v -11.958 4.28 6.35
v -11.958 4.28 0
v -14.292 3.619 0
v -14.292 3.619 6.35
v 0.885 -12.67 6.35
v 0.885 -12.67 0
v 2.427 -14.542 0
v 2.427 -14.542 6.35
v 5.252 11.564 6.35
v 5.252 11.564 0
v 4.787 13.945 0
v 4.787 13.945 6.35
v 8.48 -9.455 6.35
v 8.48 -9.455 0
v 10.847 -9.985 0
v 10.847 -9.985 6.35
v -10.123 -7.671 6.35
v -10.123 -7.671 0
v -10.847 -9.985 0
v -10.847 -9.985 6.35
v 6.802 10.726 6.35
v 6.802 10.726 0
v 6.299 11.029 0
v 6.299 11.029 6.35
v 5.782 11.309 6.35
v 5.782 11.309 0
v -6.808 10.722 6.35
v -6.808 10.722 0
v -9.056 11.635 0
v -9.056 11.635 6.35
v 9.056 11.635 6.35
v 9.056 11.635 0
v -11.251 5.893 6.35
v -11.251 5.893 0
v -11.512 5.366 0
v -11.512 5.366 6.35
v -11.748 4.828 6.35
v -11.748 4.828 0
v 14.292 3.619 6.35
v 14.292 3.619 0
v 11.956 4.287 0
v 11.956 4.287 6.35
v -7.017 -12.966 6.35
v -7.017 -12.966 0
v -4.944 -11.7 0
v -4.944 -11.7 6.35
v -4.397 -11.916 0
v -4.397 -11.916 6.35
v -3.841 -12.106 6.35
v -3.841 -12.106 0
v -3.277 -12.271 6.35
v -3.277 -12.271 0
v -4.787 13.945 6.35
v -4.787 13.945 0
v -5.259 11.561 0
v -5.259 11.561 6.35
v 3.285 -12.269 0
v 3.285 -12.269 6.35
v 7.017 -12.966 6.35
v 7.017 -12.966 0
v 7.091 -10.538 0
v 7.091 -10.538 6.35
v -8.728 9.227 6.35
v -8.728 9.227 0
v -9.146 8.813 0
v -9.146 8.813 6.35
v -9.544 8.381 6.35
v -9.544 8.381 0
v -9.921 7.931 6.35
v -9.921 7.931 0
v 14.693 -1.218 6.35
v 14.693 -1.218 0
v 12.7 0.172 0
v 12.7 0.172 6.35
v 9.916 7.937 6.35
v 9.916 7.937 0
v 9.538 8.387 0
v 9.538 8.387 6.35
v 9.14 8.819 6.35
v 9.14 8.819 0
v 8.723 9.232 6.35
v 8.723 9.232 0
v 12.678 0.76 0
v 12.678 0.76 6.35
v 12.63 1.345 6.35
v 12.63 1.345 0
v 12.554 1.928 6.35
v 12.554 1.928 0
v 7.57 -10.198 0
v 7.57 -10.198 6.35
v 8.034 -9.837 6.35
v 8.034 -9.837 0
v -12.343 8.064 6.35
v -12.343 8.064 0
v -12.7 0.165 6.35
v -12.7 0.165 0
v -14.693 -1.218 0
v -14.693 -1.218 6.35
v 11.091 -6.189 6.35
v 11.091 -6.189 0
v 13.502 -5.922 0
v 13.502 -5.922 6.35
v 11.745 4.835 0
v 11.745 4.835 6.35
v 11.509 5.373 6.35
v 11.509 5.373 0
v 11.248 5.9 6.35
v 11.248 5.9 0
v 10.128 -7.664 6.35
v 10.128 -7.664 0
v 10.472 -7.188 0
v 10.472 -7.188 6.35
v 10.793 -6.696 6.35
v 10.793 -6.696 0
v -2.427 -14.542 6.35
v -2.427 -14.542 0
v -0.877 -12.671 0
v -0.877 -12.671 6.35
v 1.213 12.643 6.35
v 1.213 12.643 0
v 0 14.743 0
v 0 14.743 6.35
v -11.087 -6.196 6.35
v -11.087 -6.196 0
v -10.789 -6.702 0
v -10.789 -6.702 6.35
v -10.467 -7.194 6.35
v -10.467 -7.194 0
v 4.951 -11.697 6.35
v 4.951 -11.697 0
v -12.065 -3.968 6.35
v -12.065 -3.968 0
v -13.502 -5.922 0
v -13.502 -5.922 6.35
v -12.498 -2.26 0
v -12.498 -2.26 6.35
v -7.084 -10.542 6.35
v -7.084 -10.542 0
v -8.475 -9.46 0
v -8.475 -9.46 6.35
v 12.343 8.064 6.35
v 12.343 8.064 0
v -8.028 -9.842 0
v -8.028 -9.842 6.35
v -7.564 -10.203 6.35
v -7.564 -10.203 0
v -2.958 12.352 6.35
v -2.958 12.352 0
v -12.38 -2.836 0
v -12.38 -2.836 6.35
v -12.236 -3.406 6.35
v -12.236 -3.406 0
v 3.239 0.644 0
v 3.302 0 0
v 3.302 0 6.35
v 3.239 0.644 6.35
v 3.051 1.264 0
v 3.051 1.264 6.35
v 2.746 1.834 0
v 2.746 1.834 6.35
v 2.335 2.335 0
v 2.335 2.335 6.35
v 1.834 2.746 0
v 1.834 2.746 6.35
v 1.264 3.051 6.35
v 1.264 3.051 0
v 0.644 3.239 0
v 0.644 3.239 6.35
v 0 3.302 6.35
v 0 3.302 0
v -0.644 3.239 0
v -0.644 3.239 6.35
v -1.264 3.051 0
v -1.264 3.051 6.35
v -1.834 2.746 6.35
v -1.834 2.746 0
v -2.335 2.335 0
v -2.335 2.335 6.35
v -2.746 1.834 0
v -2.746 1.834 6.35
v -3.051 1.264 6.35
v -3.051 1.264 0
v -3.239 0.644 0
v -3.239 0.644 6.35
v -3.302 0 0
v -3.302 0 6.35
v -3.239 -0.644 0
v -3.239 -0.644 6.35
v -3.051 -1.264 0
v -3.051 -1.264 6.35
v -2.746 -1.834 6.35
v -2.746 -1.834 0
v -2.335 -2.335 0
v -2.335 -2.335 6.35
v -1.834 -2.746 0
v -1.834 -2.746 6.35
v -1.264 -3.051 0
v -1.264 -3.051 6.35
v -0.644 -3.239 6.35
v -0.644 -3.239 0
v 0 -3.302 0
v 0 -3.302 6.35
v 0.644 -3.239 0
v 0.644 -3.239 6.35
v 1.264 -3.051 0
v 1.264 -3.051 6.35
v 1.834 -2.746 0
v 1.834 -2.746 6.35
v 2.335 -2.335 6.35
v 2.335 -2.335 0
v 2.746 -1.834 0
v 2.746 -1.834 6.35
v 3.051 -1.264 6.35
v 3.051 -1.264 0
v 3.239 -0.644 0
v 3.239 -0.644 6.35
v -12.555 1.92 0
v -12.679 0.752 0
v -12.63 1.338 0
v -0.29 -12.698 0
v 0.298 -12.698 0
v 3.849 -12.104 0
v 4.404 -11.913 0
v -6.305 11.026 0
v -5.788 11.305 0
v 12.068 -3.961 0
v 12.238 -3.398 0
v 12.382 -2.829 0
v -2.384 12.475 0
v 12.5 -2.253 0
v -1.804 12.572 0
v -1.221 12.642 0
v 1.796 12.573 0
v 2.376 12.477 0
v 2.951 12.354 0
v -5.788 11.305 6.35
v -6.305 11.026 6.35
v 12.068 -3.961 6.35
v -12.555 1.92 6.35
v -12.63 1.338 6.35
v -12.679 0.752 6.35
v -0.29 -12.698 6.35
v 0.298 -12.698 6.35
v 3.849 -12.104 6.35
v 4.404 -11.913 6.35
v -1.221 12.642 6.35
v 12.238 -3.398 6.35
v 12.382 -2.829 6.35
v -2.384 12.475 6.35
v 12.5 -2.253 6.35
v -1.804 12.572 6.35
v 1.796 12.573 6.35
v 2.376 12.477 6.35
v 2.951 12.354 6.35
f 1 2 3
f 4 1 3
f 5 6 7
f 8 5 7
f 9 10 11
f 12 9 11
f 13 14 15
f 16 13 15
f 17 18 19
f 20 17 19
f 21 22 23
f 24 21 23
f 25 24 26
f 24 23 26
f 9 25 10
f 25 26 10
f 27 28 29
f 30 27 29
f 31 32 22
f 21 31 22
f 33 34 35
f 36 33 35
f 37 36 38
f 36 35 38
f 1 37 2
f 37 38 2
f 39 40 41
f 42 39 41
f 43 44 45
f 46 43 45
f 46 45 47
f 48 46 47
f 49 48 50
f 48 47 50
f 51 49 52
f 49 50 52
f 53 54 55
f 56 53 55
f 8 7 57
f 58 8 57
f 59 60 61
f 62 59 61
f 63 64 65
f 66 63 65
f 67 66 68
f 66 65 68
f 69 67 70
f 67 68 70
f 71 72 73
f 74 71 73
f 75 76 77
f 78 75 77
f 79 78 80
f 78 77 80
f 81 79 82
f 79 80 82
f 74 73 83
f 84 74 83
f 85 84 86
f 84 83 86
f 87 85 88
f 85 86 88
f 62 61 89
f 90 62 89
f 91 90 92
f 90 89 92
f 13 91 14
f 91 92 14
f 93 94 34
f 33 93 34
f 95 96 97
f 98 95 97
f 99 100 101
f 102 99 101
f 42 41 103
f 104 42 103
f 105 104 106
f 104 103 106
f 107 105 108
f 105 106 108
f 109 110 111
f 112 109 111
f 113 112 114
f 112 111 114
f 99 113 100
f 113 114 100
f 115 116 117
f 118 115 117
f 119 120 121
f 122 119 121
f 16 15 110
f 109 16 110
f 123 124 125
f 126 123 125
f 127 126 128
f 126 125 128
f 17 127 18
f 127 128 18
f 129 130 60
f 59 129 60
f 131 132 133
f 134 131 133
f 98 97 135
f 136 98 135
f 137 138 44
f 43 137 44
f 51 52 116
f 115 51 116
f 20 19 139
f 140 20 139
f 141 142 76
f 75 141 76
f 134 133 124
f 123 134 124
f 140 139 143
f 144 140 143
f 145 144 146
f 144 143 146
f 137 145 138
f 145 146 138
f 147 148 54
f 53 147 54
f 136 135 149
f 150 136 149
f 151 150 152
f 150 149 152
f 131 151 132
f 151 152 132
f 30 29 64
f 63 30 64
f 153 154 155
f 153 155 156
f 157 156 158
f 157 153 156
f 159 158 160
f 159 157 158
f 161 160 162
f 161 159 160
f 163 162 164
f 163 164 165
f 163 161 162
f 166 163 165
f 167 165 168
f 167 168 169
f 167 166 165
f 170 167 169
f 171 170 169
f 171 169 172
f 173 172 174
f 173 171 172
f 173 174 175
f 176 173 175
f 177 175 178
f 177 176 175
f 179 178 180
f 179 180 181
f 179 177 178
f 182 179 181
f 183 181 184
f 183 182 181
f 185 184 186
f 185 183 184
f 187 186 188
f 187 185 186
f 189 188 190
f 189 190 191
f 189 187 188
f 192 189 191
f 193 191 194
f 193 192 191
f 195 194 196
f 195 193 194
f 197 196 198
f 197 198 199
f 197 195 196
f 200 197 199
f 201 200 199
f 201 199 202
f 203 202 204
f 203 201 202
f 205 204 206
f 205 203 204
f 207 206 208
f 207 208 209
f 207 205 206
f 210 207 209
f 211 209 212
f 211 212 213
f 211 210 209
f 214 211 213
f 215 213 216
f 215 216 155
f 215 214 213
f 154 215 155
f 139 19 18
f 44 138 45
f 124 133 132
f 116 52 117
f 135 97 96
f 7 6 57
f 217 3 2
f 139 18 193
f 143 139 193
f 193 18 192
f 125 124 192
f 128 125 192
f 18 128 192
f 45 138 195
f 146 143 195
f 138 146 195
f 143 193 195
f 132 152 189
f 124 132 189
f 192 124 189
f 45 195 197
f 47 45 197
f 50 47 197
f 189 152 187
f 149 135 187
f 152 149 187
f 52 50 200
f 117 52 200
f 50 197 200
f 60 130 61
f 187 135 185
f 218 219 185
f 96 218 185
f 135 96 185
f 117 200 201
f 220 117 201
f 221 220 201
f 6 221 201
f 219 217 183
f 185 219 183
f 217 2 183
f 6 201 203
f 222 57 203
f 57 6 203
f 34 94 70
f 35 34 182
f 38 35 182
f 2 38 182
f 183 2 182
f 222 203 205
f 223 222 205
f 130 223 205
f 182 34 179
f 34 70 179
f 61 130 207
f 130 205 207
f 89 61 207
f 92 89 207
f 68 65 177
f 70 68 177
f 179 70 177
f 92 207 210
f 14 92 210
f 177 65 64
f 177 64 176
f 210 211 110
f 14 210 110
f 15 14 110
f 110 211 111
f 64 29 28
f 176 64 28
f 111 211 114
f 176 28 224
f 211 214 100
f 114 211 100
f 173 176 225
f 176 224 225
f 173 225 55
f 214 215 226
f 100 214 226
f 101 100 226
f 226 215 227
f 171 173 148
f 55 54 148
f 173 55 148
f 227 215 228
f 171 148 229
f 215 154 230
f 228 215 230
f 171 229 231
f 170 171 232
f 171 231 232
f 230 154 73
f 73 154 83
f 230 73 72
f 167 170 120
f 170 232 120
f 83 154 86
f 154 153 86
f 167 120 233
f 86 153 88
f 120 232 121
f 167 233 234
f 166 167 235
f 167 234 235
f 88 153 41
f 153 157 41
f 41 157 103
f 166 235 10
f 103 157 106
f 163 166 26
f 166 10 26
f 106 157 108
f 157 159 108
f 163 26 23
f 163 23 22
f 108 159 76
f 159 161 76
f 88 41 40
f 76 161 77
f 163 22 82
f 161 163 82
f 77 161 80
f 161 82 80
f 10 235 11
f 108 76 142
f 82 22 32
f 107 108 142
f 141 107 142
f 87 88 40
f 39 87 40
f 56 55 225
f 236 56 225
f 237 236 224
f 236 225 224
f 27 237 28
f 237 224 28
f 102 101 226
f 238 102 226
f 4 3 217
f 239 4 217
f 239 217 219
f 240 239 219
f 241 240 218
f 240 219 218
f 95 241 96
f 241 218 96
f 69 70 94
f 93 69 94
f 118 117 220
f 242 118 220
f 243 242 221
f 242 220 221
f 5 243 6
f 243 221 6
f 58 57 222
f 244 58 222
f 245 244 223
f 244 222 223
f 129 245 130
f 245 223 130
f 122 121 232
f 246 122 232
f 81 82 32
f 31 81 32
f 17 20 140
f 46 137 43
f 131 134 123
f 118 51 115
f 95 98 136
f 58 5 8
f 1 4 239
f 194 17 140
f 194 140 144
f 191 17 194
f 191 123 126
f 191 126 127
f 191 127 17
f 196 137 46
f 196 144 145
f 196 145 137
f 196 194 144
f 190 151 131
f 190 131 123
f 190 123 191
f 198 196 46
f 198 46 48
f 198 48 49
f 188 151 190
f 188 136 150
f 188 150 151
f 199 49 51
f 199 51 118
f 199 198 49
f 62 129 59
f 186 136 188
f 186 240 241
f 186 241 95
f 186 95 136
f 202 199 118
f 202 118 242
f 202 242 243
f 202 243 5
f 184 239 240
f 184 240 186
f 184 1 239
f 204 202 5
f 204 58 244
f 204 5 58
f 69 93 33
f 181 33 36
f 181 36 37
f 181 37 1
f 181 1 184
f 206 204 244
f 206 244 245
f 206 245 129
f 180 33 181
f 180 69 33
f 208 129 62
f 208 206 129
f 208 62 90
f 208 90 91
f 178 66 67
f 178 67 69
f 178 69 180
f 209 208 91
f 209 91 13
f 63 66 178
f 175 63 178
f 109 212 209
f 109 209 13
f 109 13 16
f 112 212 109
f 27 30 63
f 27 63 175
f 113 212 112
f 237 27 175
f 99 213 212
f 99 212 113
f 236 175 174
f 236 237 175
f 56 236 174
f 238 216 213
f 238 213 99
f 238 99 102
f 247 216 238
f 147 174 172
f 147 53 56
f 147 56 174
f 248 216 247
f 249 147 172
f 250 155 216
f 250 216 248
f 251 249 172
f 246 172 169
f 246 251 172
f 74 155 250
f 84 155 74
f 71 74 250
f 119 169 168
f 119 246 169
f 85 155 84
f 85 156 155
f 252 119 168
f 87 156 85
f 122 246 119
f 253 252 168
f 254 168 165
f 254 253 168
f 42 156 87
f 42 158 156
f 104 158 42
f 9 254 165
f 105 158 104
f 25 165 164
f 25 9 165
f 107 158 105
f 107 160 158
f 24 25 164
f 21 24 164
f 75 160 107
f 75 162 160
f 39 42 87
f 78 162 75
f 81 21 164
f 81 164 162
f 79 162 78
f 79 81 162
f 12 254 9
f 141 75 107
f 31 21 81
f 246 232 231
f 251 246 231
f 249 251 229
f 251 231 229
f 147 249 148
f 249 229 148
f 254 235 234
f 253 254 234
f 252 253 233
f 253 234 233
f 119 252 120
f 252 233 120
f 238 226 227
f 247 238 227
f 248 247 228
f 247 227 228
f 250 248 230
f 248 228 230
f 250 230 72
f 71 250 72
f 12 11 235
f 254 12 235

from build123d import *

# Parameters (mm, degrees)
F0_R     = 3.302
F1_DEPTH = 6.35


with BuildPart() as f1:
    # F0 (on Top) → F1 (new body)
    with BuildSketch(Plane.XY):
        with BuildLine():
            ThreePointArc((12.499722, -2.252856), (12.650669, -1.13092), (12.701119, 0))
            ThreePointArc((12.701119, 0), (12.700826, 0.086204), (12.699949, 0.172405))
            ThreePointArc((12.699949, 0.172405), (12.657421, 1.052668), (12.553954, 1.927863))
            ThreePointArc((12.553954, 1.927863), (12.311527, 3.121654), (11.955851, 4.28673))
            ThreePointArc((11.955851, 4.28673), (11.629806, 5.105489), (11.24777, 5.899668))
            ThreePointArc((11.24777, 5.899668), (10.630855, 6.95006), (9.916151, 7.936522))
            ThreePointArc((9.916151, 7.936522), (9.341922, 8.605052), (8.722716, 9.232153))
            ThreePointArc((8.722716, 9.232153), (7.798165, 10.02532), (6.801882, 10.726268))
            ThreePointArc((6.801882, 10.726268), (6.041695, 11.172123), (5.25242, 11.564191))
            ThreePointArc((5.25242, 11.564191), (4.120423, 12.01418), (2.950524, 12.353656))
            ThreePointArc((2.950524, 12.353656), (2.086757, 12.528522), (1.212943, 12.643069))
            ThreePointArc((1.212943, 12.643069), (0.607166, 12.686598), (0, 12.701119))
            ThreePointArc((0, 12.701119), (-0.610992, 12.686414), (-1.22057, 12.642335))
            ThreePointArc((-1.22057, 12.642335), (-2.094314, 12.527261), (-2.957976, 12.351874))
            ThreePointArc((-2.957976, 12.351874), (-4.12767, 12.011693), (-5.259395, 11.56102))
            ThreePointArc((-5.259395, 11.56102), (-6.048433, 11.168477), (-6.808351, 10.722163))
            ThreePointArc((-6.808351, 10.722163), (-7.804211, 10.020614), (-8.728284, 9.226889))
            ThreePointArc((-8.728284, 9.226889), (-9.347111, 8.599415), (-9.920937, 7.930538))
            ThreePointArc((-9.920937, 7.930538), (-10.635046, 6.943646), (-11.251327, 5.892882))
            ThreePointArc((-11.251327, 5.892882), (-11.632884, 5.098473), (-11.958434, 4.279517))
            ThreePointArc((-11.958434, 4.279517), (-12.313408, 3.114226), (-12.555115, 1.920289))
            ThreePointArc((-12.555115, 1.920289), (-12.658054, 1.045032), (-12.70005, 0.164744))
            ThreePointArc((-12.70005, 0.164744), (-12.657421, -1.052668), (-12.498361, -2.260396))
            ThreePointArc((-12.498361, -2.260396), (-12.311527, -3.121654), (-12.065419, -3.967882))
            ThreePointArc((-12.065419, -3.967882), (-11.629806, -5.105489), (-11.087216, -6.196133))
            ThreePointArc((-11.087216, -6.196133), (-10.630855, -6.95006), (-10.123312, -7.670526))
            ThreePointArc((-10.123312, -7.670526), (-9.341922, -8.605052), (-8.474599, -9.460423))
            ThreePointArc((-8.474599, -9.460423), (-7.798165, -10.02532), (-7.084187, -10.54195))
            ThreePointArc((-7.084187, -10.54195), (-6.041695, -11.172123), (-4.943627, -11.699528))
            ThreePointArc((-4.943627, -11.699528), (-4.120423, -12.01418), (-3.27738, -12.27099))
            ThreePointArc((-3.27738, -12.27099), (-2.086757, -12.528522), (-0.876937, -12.670809))
            ThreePointArc((-0.876937, -12.670809), (0.003831, -12.701118), (0.884581, -12.670278))
            ThreePointArc((0.884581, -12.670278), (2.094314, -12.527261), (3.284782, -12.269011))
            ThreePointArc((3.284782, -12.269011), (4.12767, -12.011693), (4.950684, -11.696544))
            ThreePointArc((4.950684, -11.696544), (6.048433, -11.168477), (7.090545, -10.537675))
            ThreePointArc((7.090545, -10.537675), (7.804211, -10.020614), (8.480304, -9.455308))
            ThreePointArc((8.480304, -9.455308), (9.347111, -8.599415), (10.127937, -7.664418))
            ThreePointArc((10.127937, -7.664418), (10.635046, -6.943646), (11.090952, -6.189443))
            ThreePointArc((11.090952, -6.189443), (11.632884, -5.098473), (12.06781, -3.960603))
            ThreePointArc((12.06781, -3.960603), (12.313408, -3.114226), (12.499722, -2.252856))
        make_face()
        Circle(F0_R, mode=Mode.SUBTRACT)
        with BuildLine():
            ThreePointArc((12.699949, 0.172405), (12.700826, 0.086204), (12.701119, 0))
            ThreePointArc((12.701119, 0), (12.650669, -1.13092), (12.499722, -2.252856))
            Line((12.499722, -2.252856), (14.69304, -1.2175))
            Line((14.69304, -1.2175), (12.699949, 0.172405))
        make_face()
        with BuildLine():
            ThreePointArc((11.955851, 4.28673), (12.311527, 3.121654), (12.553954, 1.927863))
            Line((12.553954, 1.927863), (14.292252, 3.61929))
            Line((14.292252, 3.61929), (11.955851, 4.28673))
        make_face()
        with BuildLine():
            Line((13.501609, -5.922355), (12.06781, -3.960603))
            ThreePointArc((12.06781, -3.960603), (11.632884, -5.098473), (11.090952, -6.189443))
            Line((11.090952, -6.189443), (13.501609, -5.922355))
        make_face()
        with BuildLine():
            ThreePointArc((9.916151, 7.936522), (10.630855, 6.95006), (11.24777, 5.899668))
            Line((11.24777, 5.899668), (12.342677, 8.063873))
            Line((12.342677, 8.063873), (9.916151, 7.936522))
        make_face()
        with BuildLine():
            Line((10.847069, -9.98543), (10.127937, -7.664418))
            ThreePointArc((10.127937, -7.664418), (9.347111, -8.599415), (8.480304, -9.455308))
            Line((8.480304, -9.455308), (10.847069, -9.98543))
        make_face()
        with BuildLine():
            ThreePointArc((6.801882, 10.726268), (7.798165, 10.02532), (8.722716, 9.232153))
            Line((8.722716, 9.232153), (9.055581, 11.634611))
            Line((9.055581, 11.634611), (6.801882, 10.726268))
        make_face()
        with BuildLine():
            Line((7.017081, -12.96643), (7.090545, -10.537675))
            ThreePointArc((7.090545, -10.537675), (6.048433, -11.168477), (4.950684, -11.696544))
            Line((4.950684, -11.696544), (7.017081, -12.96643))
        make_face()
        with BuildLine():
            ThreePointArc((2.950524, 12.353656), (4.120423, 12.01418), (5.25242, 11.564191))
            Line((5.25242, 11.564191), (4.787173, 13.944558))
            Line((4.787173, 13.944558), (2.950524, 12.353656))
        make_face()
        with BuildLine():
            Line((2.426683, -14.542315), (3.284782, -12.269011))
            ThreePointArc((3.284782, -12.269011), (2.094314, -12.527261), (0.884581, -12.670278))
            Line((0.884581, -12.670278), (2.426683, -14.542315))
        make_face()
        with BuildLine():
            ThreePointArc((0, 12.701119), (0.607166, 12.686598), (1.212943, 12.643069))
            Line((1.212943, 12.643069), (0, 14.743396))
            Line((0, 14.743396), (0, 12.701119))
        make_face()
        with BuildLine():
            Line((-2.426683, -14.542315), (-0.876937, -12.670809))
            ThreePointArc((-0.876937, -12.670809), (-2.086757, -12.528522), (-3.27738, -12.27099))
            Line((-3.27738, -12.27099), (-2.426683, -14.542315))
        make_face()
        with BuildLine():
            ThreePointArc((-1.22057, 12.642335), (-0.610992, 12.686414), (0, 12.701119))
            Line((0, 12.701119), (0, 14.743396))
            Line((0, 14.743396), (-1.22057, 12.642335))
        make_face()
        with BuildLine():
            Line((-7.017081, -12.96643), (-4.943627, -11.699528))
            ThreePointArc((-4.943627, -11.699528), (-6.041695, -11.172123), (-7.084187, -10.54195))
            Line((-7.084187, -10.54195), (-7.017081, -12.96643))
        make_face()
        with BuildLine():
            ThreePointArc((-5.259395, 11.56102), (-4.12767, 12.011693), (-2.957976, 12.351874))
            Line((-2.957976, 12.351874), (-4.787173, 13.944558))
            Line((-4.787173, 13.944558), (-5.259395, 11.56102))
        make_face()
        with BuildLine():
            Line((-10.847069, -9.98543), (-8.474599, -9.460423))
            ThreePointArc((-8.474599, -9.460423), (-9.341922, -8.605052), (-10.123312, -7.670526))
            Line((-10.123312, -7.670526), (-10.847069, -9.98543))
        make_face()
        with BuildLine():
            ThreePointArc((-8.728284, 9.226889), (-7.804211, 10.020614), (-6.808351, 10.722163))
            Line((-6.808351, 10.722163), (-9.055581, 11.634611))
            Line((-9.055581, 11.634611), (-8.728284, 9.226889))
        make_face()
        with BuildLine():
            Line((-13.501609, -5.922355), (-11.087216, -6.196133))
            ThreePointArc((-11.087216, -6.196133), (-11.629806, -5.105489), (-12.065419, -3.967882))
            Line((-12.065419, -3.967882), (-13.501609, -5.922355))
        make_face()
        with BuildLine():
            ThreePointArc((-11.251327, 5.892882), (-10.635046, 6.943646), (-9.920937, 7.930538))
            Line((-9.920937, 7.930538), (-12.342677, 8.063873))
            Line((-12.342677, 8.063873), (-11.251327, 5.892882))
        make_face()
        with BuildLine():
            Line((-14.69304, -1.2175), (-12.498361, -2.260396))
            ThreePointArc((-12.498361, -2.260396), (-12.657421, -1.052668), (-12.70005, 0.164744))
            Line((-12.70005, 0.164744), (-14.69304, -1.2175))
        make_face()
        with BuildLine():
            ThreePointArc((-12.555115, 1.920289), (-12.313408, 3.114226), (-11.958434, 4.279517))
            Line((-11.958434, 4.279517), (-14.292252, 3.61929))
            Line((-14.292252, 3.61929), (-12.555115, 1.920289))
        make_face()
    extrude(amount=F1_DEPTH)


solid = f1.part
